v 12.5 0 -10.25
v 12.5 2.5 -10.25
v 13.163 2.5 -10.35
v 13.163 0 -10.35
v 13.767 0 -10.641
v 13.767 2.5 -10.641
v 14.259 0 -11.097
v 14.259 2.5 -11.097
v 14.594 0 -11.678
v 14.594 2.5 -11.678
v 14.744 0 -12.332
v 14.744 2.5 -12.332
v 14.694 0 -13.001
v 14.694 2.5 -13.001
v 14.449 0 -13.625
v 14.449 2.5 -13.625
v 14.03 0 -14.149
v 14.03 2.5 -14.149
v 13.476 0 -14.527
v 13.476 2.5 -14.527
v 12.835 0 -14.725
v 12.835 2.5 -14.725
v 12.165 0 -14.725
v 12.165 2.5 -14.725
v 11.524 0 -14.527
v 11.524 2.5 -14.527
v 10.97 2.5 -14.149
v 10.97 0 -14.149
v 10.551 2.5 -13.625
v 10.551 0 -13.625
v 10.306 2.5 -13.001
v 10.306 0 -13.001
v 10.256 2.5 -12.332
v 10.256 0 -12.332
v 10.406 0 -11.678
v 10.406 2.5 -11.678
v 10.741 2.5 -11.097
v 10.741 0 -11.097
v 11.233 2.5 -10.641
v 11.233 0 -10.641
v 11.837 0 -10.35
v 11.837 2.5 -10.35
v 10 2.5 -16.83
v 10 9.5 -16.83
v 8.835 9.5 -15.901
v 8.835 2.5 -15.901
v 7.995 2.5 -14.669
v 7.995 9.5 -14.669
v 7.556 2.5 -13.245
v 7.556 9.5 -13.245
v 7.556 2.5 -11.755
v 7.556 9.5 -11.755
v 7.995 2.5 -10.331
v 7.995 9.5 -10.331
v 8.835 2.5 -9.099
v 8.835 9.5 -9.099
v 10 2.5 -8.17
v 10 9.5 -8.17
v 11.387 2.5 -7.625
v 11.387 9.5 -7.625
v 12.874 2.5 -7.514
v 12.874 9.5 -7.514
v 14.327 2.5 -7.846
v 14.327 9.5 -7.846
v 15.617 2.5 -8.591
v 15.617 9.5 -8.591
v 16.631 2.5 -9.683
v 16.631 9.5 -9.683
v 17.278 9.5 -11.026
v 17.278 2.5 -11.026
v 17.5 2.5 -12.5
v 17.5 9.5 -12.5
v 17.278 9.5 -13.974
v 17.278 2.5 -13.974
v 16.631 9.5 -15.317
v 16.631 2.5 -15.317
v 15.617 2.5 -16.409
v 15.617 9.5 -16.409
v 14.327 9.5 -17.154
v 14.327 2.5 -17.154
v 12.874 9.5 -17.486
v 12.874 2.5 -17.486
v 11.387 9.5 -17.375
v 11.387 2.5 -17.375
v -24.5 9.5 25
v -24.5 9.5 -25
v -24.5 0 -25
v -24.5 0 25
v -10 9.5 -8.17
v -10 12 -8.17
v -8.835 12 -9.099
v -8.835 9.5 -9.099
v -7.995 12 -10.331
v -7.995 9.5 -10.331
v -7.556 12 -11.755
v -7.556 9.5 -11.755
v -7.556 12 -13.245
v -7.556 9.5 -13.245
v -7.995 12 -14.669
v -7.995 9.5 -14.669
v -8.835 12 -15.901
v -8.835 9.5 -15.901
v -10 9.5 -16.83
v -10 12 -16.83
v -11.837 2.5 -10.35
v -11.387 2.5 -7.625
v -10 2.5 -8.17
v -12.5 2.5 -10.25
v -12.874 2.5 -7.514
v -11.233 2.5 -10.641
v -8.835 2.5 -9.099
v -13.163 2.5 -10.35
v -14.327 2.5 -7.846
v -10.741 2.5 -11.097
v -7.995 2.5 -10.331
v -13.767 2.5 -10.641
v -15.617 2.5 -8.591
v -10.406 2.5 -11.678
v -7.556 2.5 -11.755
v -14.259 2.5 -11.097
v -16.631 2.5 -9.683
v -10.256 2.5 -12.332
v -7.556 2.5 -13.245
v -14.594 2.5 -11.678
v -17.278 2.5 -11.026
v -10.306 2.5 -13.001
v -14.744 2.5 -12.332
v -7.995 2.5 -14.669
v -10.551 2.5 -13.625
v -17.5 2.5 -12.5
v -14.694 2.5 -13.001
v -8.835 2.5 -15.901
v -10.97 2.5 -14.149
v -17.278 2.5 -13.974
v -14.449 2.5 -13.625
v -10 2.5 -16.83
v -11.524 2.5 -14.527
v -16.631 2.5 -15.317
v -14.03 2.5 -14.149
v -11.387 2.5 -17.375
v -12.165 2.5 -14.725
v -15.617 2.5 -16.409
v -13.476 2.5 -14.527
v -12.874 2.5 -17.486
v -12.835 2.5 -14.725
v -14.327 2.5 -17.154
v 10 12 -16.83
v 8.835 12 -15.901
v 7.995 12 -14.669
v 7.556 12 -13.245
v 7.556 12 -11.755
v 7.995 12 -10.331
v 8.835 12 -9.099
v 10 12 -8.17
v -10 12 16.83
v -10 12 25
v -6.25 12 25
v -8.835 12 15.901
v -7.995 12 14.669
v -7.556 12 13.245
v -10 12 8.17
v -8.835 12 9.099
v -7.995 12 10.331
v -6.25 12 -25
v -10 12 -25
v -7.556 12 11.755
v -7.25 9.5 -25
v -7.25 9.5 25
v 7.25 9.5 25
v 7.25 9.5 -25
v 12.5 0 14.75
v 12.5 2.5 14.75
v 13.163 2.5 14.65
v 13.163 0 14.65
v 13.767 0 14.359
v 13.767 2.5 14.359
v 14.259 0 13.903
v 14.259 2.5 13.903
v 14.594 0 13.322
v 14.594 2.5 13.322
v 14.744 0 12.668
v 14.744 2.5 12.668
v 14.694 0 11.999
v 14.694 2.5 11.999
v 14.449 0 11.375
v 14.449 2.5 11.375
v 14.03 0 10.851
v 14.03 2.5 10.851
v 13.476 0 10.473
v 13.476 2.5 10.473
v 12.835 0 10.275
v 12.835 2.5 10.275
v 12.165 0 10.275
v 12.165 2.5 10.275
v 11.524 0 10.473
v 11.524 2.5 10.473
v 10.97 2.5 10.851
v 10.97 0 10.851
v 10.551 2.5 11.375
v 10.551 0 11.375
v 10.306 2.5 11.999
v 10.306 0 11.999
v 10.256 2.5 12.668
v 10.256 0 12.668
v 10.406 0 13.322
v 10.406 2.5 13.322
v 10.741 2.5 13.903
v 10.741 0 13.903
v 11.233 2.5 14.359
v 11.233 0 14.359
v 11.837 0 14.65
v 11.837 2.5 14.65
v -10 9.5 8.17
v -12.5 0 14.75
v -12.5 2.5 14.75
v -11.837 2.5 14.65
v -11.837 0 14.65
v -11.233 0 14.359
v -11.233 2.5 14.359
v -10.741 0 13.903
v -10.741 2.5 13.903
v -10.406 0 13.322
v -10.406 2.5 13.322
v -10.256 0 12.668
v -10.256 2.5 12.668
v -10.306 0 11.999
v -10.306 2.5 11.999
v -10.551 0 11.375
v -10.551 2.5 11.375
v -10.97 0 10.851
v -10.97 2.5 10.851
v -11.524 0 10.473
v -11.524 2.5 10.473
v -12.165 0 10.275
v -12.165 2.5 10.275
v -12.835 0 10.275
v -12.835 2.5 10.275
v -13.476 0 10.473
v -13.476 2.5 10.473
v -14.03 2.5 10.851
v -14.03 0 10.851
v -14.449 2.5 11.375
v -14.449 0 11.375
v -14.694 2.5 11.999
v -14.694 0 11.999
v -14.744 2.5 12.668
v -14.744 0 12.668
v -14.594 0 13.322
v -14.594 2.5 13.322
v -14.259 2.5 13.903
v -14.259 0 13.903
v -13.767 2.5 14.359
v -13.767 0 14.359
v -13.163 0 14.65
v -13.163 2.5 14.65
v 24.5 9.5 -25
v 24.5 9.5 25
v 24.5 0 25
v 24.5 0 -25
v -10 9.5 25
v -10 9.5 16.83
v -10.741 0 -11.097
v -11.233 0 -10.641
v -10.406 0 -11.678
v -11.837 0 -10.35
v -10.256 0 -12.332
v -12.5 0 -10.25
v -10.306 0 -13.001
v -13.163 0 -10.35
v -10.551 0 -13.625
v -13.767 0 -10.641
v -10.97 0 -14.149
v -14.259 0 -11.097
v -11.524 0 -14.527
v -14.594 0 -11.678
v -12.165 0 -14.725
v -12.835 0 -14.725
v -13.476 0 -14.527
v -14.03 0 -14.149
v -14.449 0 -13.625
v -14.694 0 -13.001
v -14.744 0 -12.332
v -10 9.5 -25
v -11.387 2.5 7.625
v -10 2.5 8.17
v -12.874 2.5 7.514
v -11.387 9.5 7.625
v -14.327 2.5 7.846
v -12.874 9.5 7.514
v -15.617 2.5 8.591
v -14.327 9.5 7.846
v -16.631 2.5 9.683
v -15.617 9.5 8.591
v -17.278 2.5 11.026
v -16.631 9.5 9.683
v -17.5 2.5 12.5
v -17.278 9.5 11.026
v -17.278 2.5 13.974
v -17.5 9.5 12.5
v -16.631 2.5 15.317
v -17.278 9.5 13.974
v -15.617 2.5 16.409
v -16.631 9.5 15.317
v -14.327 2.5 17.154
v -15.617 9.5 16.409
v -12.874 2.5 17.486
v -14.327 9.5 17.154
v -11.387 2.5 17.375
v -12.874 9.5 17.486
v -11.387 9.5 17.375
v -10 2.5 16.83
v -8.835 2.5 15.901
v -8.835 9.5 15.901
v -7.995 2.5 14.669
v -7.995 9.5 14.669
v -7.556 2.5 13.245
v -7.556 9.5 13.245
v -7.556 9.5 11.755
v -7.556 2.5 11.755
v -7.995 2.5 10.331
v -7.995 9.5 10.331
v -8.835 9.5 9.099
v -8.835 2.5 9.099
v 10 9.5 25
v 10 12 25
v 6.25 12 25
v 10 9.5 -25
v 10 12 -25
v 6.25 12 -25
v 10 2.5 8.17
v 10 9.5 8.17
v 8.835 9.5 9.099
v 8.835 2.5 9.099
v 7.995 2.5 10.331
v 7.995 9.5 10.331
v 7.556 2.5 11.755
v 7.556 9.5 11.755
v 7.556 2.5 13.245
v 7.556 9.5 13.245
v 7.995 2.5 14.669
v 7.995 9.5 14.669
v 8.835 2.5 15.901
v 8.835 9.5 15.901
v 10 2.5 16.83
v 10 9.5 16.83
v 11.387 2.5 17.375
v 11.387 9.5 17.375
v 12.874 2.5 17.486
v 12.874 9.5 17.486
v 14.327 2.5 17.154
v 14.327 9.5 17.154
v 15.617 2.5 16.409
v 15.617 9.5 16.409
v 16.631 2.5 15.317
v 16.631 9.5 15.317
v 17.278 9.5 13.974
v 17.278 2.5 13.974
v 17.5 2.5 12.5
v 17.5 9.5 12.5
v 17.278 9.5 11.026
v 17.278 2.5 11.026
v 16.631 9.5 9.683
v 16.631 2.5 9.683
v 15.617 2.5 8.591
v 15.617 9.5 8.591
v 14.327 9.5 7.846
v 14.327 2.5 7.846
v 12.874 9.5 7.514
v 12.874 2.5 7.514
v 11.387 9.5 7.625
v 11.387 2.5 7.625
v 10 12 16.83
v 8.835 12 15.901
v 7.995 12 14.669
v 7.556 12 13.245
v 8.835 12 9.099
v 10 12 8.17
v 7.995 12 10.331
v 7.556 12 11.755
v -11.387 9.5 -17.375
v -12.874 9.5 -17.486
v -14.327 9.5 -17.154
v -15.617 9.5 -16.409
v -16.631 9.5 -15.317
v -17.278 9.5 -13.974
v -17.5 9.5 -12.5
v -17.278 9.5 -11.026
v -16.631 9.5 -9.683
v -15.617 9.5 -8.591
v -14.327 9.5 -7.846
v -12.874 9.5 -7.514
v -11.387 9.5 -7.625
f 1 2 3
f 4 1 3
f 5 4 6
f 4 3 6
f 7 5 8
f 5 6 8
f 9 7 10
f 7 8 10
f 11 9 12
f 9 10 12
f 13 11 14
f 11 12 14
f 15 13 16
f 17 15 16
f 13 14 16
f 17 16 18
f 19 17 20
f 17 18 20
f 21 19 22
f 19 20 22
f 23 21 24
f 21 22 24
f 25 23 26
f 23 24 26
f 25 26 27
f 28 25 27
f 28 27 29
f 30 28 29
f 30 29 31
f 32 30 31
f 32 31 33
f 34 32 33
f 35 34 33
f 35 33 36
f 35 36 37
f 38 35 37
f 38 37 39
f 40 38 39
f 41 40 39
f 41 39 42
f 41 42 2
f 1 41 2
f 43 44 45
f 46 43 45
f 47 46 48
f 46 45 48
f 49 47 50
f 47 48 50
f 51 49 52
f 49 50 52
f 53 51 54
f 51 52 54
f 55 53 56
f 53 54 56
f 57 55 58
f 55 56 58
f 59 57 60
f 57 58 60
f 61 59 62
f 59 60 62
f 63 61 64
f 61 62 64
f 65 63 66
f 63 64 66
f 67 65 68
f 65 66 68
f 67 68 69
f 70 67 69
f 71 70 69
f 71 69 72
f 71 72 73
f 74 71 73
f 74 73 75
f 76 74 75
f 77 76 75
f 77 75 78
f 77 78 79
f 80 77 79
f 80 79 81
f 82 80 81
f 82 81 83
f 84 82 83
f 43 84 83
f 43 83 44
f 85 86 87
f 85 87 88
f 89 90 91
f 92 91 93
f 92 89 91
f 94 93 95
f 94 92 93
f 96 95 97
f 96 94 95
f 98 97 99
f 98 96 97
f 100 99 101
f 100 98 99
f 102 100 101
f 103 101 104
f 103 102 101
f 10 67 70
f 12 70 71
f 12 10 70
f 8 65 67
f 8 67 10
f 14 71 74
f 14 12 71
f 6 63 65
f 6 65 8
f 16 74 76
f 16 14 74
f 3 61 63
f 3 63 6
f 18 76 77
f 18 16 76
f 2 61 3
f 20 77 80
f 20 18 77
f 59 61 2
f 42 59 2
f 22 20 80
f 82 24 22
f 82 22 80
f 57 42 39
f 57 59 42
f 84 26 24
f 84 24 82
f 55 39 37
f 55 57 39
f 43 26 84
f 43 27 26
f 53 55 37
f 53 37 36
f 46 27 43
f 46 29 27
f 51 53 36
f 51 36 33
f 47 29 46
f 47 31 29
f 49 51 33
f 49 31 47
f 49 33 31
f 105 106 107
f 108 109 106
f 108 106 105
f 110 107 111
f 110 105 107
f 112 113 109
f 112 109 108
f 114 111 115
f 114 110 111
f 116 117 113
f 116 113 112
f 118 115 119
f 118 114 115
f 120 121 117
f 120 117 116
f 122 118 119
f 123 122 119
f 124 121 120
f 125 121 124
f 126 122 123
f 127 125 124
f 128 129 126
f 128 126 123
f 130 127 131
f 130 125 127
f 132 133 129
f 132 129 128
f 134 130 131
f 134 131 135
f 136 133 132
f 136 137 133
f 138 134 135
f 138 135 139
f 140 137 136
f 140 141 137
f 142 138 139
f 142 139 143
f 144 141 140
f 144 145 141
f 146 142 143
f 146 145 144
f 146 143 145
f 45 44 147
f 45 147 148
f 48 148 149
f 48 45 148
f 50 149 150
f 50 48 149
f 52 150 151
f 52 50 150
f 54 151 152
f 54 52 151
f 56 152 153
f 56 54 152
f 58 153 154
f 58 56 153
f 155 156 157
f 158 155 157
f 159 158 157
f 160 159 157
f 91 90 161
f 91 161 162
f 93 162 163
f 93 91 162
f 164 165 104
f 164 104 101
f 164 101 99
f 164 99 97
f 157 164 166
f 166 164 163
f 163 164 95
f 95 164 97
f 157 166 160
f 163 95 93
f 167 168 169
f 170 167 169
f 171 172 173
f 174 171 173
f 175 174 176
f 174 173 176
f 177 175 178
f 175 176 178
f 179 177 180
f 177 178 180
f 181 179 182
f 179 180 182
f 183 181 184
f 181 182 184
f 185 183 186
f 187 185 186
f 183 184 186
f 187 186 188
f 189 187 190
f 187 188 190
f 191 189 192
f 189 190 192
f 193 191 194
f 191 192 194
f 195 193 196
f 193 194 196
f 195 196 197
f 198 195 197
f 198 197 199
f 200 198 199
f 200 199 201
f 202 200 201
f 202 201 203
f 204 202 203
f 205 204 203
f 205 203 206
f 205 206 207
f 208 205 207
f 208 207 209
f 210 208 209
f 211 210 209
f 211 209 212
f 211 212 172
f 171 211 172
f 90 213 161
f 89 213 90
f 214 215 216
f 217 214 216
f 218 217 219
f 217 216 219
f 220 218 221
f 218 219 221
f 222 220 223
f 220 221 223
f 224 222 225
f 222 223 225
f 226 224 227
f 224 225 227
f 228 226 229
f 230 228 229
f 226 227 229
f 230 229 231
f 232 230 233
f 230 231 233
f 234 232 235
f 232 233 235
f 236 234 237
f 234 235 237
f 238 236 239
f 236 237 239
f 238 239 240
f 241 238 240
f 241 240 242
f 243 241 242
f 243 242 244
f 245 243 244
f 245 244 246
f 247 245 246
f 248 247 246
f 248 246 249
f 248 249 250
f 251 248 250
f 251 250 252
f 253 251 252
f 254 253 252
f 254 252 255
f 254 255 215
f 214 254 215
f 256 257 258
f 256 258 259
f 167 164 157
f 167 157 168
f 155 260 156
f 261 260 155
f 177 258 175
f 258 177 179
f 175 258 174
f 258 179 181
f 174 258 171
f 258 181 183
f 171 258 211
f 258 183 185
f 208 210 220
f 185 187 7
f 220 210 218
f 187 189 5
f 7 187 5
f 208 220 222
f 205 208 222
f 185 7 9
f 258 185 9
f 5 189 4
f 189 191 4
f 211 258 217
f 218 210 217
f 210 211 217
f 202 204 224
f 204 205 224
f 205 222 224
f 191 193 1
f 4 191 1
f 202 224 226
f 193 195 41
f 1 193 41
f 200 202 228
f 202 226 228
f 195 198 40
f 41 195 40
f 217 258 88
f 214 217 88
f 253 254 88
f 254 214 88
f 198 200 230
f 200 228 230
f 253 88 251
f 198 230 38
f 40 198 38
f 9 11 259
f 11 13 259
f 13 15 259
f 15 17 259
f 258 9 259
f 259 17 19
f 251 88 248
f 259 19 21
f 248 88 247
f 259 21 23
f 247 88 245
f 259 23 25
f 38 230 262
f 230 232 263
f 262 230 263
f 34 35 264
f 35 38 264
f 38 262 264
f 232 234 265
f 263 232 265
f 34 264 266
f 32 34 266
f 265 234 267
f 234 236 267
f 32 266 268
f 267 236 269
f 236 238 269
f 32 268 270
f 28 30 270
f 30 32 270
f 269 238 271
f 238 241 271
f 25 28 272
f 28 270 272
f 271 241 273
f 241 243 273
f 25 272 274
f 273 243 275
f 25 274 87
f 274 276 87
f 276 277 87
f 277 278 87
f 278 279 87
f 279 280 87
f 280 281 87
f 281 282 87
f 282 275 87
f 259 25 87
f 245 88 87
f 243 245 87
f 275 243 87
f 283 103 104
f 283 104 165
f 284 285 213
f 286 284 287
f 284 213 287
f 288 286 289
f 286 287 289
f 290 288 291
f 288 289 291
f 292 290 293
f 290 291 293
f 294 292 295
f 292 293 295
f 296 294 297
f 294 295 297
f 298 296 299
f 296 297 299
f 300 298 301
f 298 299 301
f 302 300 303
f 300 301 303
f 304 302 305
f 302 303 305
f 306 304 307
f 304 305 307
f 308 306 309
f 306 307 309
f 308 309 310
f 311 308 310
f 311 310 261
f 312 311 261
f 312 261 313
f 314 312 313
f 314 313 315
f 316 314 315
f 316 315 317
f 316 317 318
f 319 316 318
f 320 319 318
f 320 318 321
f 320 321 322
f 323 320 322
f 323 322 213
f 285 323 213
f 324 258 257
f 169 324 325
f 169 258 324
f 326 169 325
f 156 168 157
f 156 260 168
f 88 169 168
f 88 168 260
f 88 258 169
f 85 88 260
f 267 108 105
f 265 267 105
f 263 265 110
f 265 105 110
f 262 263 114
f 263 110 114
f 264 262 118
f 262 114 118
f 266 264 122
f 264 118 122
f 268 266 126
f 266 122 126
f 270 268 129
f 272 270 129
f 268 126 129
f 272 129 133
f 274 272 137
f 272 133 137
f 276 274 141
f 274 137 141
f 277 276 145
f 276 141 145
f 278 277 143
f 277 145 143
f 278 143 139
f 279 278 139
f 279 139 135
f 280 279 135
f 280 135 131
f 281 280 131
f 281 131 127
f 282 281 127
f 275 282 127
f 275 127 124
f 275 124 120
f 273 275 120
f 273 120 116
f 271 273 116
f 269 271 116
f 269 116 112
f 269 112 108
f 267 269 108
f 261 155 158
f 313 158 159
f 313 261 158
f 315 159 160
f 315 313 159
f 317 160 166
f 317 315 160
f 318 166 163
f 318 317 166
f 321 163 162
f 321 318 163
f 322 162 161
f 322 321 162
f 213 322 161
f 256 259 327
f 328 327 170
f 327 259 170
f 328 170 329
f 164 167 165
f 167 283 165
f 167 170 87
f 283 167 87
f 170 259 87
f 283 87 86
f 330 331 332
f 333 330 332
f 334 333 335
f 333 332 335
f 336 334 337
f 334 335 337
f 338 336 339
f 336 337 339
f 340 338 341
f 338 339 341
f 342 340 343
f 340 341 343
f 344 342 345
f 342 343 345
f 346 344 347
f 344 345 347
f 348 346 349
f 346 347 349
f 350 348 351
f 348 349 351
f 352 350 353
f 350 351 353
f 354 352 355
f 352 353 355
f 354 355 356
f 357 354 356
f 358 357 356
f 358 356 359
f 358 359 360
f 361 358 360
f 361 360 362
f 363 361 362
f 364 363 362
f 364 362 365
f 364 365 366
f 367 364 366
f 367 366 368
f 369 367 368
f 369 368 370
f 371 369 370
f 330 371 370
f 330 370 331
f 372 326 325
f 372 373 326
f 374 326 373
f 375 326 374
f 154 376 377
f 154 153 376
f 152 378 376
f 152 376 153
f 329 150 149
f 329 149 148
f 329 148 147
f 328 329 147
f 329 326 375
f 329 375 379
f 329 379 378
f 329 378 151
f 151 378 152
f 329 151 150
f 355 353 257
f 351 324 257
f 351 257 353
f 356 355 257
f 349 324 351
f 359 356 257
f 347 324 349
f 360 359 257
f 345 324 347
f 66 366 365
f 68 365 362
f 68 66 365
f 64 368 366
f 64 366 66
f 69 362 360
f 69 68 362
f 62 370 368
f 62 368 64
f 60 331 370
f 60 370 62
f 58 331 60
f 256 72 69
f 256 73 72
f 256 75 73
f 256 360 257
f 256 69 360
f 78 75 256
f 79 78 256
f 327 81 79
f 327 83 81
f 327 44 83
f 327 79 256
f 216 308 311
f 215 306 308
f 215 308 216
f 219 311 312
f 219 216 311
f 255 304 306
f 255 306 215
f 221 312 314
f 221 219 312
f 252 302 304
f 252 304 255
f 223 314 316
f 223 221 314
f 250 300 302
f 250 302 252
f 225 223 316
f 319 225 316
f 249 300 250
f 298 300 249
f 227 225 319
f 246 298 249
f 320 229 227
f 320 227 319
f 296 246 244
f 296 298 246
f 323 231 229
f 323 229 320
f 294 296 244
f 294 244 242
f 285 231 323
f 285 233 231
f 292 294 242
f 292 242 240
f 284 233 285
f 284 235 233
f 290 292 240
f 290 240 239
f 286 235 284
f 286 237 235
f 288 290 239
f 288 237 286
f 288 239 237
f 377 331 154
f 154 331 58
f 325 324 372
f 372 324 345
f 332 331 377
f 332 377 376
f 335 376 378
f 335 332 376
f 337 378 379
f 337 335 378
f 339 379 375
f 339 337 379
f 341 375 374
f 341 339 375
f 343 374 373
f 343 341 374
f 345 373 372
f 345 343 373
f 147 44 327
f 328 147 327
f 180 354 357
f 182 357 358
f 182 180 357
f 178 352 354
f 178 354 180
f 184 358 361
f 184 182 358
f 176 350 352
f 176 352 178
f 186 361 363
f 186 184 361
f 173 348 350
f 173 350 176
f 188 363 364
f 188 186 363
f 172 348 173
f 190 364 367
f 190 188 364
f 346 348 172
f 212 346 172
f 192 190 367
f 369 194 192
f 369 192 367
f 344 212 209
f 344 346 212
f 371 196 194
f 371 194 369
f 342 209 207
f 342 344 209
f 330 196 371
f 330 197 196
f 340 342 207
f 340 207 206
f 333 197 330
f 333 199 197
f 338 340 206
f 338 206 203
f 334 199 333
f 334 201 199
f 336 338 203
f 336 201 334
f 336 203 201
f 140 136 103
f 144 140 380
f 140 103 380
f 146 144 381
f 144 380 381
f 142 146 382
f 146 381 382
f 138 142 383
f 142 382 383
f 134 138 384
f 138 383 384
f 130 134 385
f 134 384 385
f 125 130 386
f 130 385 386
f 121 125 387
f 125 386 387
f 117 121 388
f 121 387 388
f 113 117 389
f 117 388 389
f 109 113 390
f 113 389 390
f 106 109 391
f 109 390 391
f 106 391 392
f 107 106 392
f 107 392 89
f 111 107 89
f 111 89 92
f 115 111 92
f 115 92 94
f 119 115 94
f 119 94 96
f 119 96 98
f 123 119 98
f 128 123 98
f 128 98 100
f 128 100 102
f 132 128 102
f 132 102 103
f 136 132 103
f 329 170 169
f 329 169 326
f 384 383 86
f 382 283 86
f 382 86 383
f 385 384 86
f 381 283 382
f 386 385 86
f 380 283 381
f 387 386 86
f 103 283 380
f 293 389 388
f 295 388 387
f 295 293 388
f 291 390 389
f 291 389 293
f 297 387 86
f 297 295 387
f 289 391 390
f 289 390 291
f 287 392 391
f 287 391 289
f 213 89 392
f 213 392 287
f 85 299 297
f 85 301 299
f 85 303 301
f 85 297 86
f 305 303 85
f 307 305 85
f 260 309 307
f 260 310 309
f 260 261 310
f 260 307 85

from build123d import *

# Parameters (mm, degrees)
SKETCH1_W                      = 20
SKETCH1_H                      = 50
BOSS_EXTRUDE1_DEPTH            = 12
CUT_EXTRUDE1_REACH             = 54.383
SKETCH4_W                      = 50
SKETCH4_H                      = 9.5
BOSS_EXTRUDE2_DEPTH            = 14.5
SKETCH5_W                      = 50
SKETCH5_H                      = 9.5
BOSS_EXTRUDE3_DEPTH            = 14.5
SKETCH10_R                     = 5
CUT_EXTRUDE4_DEPTH             = 7
CUT_EXTRUDE4_DIRECTION_2_REACH = 38.27
CUT_EXTRUDE5_REACH             = 38.27
SKETCH11_R                     = 2.25


with BuildPart() as part:
    # Sketch1 → Boss-Extrude1 (new body)
    with BuildSketch(Plane(origin=(0, 0, 0), x_dir=(1, 0, 0), z_dir=(0, 1, 0))):
        Rectangle(SKETCH1_W, SKETCH1_H)
    extrude(amount=BOSS_EXTRUDE1_DEPTH)

    # Sketch2 → Cut-Extrude1 (cut, up to next)
    with BuildSketch(Plane.XY.offset(25), mode=Mode.PRIVATE) as cut_extrude1_sk1:
        Polygon((0, 9.5), (7.25, 9.5), (6.25, 12), (0, 12), (-6.25, 12), (-7.25, 9.5), align=None)
    cut_extrude1_tool1 = extrude(cut_extrude1_sk1.sketch, amount=-CUT_EXTRUDE1_REACH, mode=Mode.PRIVATE) & part.part
    add(cut_extrude1_tool1.solids().sort_by_distance((0, 10.719136, 25))[0], mode=Mode.SUBTRACT)

    # Sketch4 → Boss-Extrude2 (add)
    with BuildSketch(Plane.ZY.offset(10)):
        with Locations((0, 4.75)):
            Rectangle(SKETCH4_W, SKETCH4_H)
    extrude(amount=BOSS_EXTRUDE2_DEPTH)

    # Sketch5 → Boss-Extrude3 (add)
    with BuildSketch(Plane(origin=(10, 0, 0), x_dir=(0, 0, -1), z_dir=(1, 0, 0))):
        with Locations((0, 4.75)):
            Rectangle(SKETCH5_W, SKETCH5_H)
    extrude(amount=BOSS_EXTRUDE3_DEPTH)

    # Sketch10 → Cut-Extrude4 (cut)
    with BuildSketch(Plane(origin=(0, 9.5, 0), x_dir=(1, 0, 0), z_dir=(0, 1, 0))):
        with Locations(Location((-12.5, 12.5, 0), (0, 0, 60))):
            Circle(SKETCH10_R)
        with Locations(Location((12.5, 12.5, 0), (0, 0, 120))):
            Circle(SKETCH10_R)
        with Locations(Location((-12.5, -12.5, 0), (0, 0, 60))):
            Circle(SKETCH10_R)
        with Locations(Location((12.5, -12.5, 0), (0, 0, 120))):
            Circle(SKETCH10_R)
    extrude(amount=-CUT_EXTRUDE4_DEPTH, mode=Mode.SUBTRACT)

    # Sketch10 → Cut-Extrude4 direction 2 (cut, up to next)
    with BuildSketch(Plane(origin=(0, 9.5, 0), x_dir=(1, 0, 0), z_dir=(0, 1, 0)), mode=Mode.PRIVATE) as cut_extrude4_direction_2_sk1:
        with Locations(Location((-12.5, 12.5, 0), (0, 0, 60))):
            Circle(SKETCH10_R)
    cut_extrude4_direction_2_tool1 = extrude(cut_extrude4_direction_2_sk1.sketch, amount=CUT_EXTRUDE4_DIRECTION_2_REACH, mode=Mode.PRIVATE) & part.part
    # Sketch10 → Cut-Extrude4 direction 2 (cut, up to next)
    with BuildSketch(Plane(origin=(0, 9.5, 0), x_dir=(1, 0, 0), z_dir=(0, 1, 0)), mode=Mode.PRIVATE) as cut_extrude4_direction_2_sk2:
        with Locations(Location((12.5, 12.5, 0), (0, 0, 120))):
            Circle(SKETCH10_R)
    cut_extrude4_direction_2_tool2 = extrude(cut_extrude4_direction_2_sk2.sketch, amount=CUT_EXTRUDE4_DIRECTION_2_REACH, mode=Mode.PRIVATE) & part.part
    # Sketch10 → Cut-Extrude4 direction 2 (cut, up to next)
    with BuildSketch(Plane(origin=(0, 9.5, 0), x_dir=(1, 0, 0), z_dir=(0, 1, 0)), mode=Mode.PRIVATE) as cut_extrude4_direction_2_sk3:
        with Locations(Location((-12.5, -12.5, 0), (0, 0, 60))):
            Circle(SKETCH10_R)
    cut_extrude4_direction_2_tool3 = extrude(cut_extrude4_direction_2_sk3.sketch, amount=CUT_EXTRUDE4_DIRECTION_2_REACH, mode=Mode.PRIVATE) & part.part
    # Sketch10 → Cut-Extrude4 direction 2 (cut, up to next)
    with BuildSketch(Plane(origin=(0, 9.5, 0), x_dir=(1, 0, 0), z_dir=(0, 1, 0)), mode=Mode.PRIVATE) as cut_extrude4_direction_2_sk4:
        with Locations(Location((12.5, -12.5, 0), (0, 0, 120))):
            Circle(SKETCH10_R)
    cut_extrude4_direction_2_tool4 = extrude(cut_extrude4_direction_2_sk4.sketch, amount=CUT_EXTRUDE4_DIRECTION_2_REACH, mode=Mode.PRIVATE) & part.part
    add(cut_extrude4_direction_2_tool1.solids().sort_by_distance((-12.5, 9.5, -12.5))[0], mode=Mode.SUBTRACT)
    add(cut_extrude4_direction_2_tool2.solids().sort_by_distance((12.5, 9.5, -12.5))[0], mode=Mode.SUBTRACT)
    add(cut_extrude4_direction_2_tool3.solids().sort_by_distance((-12.5, 9.5, 12.5))[0], mode=Mode.SUBTRACT)
    add(cut_extrude4_direction_2_tool4.solids().sort_by_distance((12.5, 9.5, 12.5))[0], mode=Mode.SUBTRACT)

    # Sketch11 → Cut-Extrude5 (cut, up to next)
    with BuildSketch(Plane(origin=(0, 2.5, 0), x_dir=(1, 0, 0), z_dir=(0, 1, 0)), mode=Mode.PRIVATE) as cut_extrude5_sk1:
        with Locations(Location((-12.5, 12.5, 0), (0, 0, 270))):
            Circle(SKETCH11_R)
    cut_extrude5_tool1 = extrude(cut_extrude5_sk1.sketch, amount=-CUT_EXTRUDE5_REACH, mode=Mode.PRIVATE) & part.part
    # Sketch11 → Cut-Extrude5 (cut, up to next)
    with BuildSketch(Plane(origin=(0, 2.5, 0), x_dir=(1, 0, 0), z_dir=(0, 1, 0)), mode=Mode.PRIVATE) as cut_extrude5_sk2:
        with Locations(Location((12.5, 12.5, 0), (0, 0, 270))):
            Circle(SKETCH11_R)
    cut_extrude5_tool2 = extrude(cut_extrude5_sk2.sketch, amount=-CUT_EXTRUDE5_REACH, mode=Mode.PRIVATE) & part.part
    # Sketch11 → Cut-Extrude5 (cut, up to next)
    with BuildSketch(Plane(origin=(0, 2.5, 0), x_dir=(1, 0, 0), z_dir=(0, 1, 0)), mode=Mode.PRIVATE) as cut_extrude5_sk3:
        with Locations(Location((-12.5, -12.5, 0), (0, 0, 270))):
            Circle(SKETCH11_R)
    cut_extrude5_tool3 = extrude(cut_extrude5_sk3.sketch, amount=-CUT_EXTRUDE5_REACH, mode=Mode.PRIVATE) & part.part
    # Sketch11 → Cut-Extrude5 (cut, up to next)
    with BuildSketch(Plane(origin=(0, 2.5, 0), x_dir=(1, 0, 0), z_dir=(0, 1, 0)), mode=Mode.PRIVATE) as cut_extrude5_sk4:
        with Locations(Location((12.5, -12.5, 0), (0, 0, 270))):
            Circle(SKETCH11_R)
    cut_extrude5_tool4 = extrude(cut_extrude5_sk4.sketch, amount=-CUT_EXTRUDE5_REACH, mode=Mode.PRIVATE) & part.part
    add(cut_extrude5_tool1.solids().sort_by_distance((-12.5, 2.5, -12.5))[0], mode=Mode.SUBTRACT)
    add(cut_extrude5_tool2.solids().sort_by_distance((12.5, 2.5, -12.5))[0], mode=Mode.SUBTRACT)
    add(cut_extrude5_tool3.solids().sort_by_distance((-12.5, 2.5, 12.5))[0], mode=Mode.SUBTRACT)
    add(cut_extrude5_tool4.solids().sort_by_distance((12.5, 2.5, 12.5))[0], mode=Mode.SUBTRACT)


solid = part.part
